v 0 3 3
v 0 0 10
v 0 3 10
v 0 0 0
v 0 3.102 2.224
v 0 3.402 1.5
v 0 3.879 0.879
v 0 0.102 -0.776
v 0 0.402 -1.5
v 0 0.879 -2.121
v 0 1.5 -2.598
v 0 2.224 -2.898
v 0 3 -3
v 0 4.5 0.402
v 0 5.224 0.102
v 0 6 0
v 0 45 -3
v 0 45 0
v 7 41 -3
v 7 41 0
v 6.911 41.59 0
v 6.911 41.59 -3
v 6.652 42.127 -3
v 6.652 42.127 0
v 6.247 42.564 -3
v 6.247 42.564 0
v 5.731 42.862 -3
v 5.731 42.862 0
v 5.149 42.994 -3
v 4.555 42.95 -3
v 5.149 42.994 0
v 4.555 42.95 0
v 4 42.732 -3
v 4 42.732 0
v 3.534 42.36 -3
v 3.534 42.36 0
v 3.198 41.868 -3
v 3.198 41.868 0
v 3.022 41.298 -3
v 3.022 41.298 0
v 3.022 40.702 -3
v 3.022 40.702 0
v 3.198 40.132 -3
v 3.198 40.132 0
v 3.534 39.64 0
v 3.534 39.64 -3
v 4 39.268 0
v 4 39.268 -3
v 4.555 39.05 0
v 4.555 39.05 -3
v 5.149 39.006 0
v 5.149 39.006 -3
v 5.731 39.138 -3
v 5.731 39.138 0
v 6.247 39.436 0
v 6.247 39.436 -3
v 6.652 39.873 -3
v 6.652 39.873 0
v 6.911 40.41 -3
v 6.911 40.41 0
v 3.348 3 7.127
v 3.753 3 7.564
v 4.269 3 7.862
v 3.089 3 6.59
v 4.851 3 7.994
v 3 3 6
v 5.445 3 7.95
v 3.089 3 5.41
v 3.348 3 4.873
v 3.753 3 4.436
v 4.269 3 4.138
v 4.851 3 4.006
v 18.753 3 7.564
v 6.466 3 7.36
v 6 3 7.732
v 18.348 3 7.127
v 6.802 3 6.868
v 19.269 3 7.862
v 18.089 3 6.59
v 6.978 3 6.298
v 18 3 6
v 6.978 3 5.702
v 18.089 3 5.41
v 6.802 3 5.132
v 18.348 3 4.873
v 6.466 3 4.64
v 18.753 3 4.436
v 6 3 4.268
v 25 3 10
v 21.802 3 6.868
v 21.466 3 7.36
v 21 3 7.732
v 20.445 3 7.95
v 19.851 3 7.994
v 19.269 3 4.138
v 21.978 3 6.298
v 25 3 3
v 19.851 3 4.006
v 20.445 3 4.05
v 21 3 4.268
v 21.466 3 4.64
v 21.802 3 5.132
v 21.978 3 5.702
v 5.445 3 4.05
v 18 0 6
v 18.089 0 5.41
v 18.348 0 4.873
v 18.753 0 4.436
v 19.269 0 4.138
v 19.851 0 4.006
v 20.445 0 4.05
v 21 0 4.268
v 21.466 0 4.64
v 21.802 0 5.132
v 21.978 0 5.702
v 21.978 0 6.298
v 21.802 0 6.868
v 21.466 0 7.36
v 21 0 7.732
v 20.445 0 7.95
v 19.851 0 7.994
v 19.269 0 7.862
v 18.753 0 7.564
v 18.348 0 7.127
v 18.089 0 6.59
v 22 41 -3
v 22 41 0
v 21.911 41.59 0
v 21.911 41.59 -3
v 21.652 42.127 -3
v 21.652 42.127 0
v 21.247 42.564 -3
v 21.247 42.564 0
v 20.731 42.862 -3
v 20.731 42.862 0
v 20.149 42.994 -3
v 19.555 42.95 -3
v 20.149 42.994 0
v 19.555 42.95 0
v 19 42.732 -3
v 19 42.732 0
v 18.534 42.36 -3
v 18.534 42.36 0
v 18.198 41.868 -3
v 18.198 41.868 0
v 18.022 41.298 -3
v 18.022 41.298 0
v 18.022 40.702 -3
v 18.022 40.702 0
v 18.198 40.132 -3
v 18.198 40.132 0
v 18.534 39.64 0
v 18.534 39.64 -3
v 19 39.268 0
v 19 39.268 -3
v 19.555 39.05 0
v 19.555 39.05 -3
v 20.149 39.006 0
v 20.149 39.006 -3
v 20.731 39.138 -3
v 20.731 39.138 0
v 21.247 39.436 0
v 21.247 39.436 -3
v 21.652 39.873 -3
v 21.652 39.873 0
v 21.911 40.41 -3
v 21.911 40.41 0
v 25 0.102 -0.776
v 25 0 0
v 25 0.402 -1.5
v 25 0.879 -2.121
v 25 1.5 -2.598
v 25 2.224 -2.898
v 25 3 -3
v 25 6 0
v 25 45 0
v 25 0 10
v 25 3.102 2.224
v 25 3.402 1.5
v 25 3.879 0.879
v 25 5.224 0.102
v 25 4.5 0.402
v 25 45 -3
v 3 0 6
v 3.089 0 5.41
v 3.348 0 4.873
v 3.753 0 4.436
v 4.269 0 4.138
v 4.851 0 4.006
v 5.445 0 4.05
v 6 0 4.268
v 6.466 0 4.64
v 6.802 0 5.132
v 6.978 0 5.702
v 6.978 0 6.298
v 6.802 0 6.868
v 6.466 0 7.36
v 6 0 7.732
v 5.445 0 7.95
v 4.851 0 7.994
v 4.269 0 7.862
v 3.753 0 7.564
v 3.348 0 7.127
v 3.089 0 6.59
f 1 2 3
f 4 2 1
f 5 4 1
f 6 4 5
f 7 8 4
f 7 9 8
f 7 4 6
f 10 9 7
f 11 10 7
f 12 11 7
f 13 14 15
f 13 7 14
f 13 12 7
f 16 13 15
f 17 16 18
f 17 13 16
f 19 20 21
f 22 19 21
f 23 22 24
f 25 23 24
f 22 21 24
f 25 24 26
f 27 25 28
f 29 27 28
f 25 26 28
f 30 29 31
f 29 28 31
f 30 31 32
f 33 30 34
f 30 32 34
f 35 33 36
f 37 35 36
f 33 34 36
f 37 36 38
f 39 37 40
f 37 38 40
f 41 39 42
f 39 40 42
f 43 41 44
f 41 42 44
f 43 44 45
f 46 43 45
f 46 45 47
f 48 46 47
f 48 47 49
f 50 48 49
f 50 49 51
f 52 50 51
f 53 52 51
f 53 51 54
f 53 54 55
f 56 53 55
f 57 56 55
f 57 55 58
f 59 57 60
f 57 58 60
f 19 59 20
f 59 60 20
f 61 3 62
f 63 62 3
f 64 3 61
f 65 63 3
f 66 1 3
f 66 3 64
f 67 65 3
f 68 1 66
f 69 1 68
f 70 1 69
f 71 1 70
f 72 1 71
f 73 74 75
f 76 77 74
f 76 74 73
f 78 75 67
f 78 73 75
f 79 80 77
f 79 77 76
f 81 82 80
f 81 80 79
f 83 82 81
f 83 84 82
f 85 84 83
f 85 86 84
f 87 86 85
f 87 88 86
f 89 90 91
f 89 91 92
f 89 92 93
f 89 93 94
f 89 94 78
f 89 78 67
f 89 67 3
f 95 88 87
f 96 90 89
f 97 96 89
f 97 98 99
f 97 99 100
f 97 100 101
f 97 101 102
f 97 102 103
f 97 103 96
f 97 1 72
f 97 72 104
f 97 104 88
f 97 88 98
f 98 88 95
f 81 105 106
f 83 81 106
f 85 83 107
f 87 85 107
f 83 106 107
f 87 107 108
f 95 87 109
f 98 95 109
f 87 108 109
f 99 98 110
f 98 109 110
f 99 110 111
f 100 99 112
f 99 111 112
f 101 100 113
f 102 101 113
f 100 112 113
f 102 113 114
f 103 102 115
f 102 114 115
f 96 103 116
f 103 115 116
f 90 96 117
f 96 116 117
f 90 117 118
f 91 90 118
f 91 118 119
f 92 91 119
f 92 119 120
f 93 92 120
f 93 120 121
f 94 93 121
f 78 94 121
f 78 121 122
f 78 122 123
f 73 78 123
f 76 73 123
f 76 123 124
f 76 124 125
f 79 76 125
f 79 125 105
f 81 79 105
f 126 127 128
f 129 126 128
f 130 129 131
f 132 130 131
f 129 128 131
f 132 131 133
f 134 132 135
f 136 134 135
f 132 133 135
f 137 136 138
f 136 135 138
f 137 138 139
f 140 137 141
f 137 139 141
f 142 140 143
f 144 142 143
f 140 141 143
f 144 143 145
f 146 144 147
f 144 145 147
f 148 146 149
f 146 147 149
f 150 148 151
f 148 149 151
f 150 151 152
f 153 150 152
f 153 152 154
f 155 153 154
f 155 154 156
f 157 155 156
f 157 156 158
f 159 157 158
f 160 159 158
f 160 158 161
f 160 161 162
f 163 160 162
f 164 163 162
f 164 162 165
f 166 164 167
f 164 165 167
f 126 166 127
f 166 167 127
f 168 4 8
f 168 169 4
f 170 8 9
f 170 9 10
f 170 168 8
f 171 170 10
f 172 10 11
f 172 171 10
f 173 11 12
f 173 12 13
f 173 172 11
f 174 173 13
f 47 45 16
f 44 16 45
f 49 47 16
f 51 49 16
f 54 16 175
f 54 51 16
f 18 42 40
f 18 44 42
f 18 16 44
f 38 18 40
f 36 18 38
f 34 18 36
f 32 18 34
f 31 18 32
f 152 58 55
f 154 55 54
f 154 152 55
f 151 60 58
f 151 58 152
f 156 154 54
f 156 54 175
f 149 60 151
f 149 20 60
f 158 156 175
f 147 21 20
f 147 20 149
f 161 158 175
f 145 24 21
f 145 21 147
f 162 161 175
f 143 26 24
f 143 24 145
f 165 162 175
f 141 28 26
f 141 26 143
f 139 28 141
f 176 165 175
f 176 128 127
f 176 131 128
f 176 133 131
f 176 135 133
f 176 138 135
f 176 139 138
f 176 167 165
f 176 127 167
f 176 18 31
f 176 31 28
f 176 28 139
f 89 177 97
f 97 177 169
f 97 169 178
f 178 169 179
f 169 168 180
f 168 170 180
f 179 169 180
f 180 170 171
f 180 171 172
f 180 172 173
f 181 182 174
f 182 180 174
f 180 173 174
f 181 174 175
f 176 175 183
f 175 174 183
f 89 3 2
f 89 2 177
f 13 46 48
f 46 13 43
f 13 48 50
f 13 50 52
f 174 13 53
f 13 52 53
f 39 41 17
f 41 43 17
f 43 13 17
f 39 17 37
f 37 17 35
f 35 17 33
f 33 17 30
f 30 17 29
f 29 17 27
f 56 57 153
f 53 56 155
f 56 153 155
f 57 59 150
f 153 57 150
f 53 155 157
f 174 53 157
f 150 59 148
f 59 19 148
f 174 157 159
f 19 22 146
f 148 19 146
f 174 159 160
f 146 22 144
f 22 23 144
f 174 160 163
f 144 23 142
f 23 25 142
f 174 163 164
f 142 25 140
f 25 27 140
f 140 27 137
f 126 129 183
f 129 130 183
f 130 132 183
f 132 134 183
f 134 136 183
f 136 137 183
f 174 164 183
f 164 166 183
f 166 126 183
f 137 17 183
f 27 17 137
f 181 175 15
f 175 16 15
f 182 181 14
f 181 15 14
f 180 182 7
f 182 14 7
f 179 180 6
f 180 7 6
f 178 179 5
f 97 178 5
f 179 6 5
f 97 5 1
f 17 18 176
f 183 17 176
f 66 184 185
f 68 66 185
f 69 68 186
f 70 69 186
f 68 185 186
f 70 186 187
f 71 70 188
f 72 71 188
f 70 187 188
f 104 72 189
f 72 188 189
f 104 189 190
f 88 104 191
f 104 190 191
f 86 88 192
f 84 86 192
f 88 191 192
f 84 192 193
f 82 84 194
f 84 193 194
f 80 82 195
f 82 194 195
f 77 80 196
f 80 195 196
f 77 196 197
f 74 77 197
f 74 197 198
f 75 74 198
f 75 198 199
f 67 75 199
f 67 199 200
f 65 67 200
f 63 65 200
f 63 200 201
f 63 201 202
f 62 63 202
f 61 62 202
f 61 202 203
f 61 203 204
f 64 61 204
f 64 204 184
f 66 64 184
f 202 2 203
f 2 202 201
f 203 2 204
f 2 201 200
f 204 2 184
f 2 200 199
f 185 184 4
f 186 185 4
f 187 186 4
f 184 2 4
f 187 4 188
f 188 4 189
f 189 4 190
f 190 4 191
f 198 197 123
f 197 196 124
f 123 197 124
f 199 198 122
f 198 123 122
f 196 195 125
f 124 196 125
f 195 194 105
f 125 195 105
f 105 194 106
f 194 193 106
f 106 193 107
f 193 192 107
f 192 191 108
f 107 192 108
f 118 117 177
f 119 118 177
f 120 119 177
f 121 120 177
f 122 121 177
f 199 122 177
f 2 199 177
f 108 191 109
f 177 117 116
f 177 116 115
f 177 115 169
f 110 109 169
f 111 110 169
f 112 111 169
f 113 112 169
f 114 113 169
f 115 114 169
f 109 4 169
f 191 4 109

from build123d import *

# Parameters (mm, degrees)
SKETCH1_W           = 25
SKETCH1_H           = 45
SKETCH1_R           = 2
BOSS_EXTRUDE1_DEPTH = 3
BOSS_EXTRUDE2_START = -3
SKETCH1_3_W         = 25
SKETCH1_3_H         = 3
BOSS_EXTRUDE2_DEPTH = 13
FILLET1_R           = 3
SKETCH2_R           = 2
CUT_EXTRUDE1_DEPTH  = 46


with BuildPart() as part:
    # Sketch1 → Boss-Extrude1 (new body)
    with BuildSketch(Plane.XY):
        with Locations((12.5, 22.5)):
            Rectangle(SKETCH1_W, SKETCH1_H)
        with Locations((20, 41)):
            Circle(SKETCH1_R, mode=Mode.SUBTRACT)
        with Locations((5, 41)):
            Circle(SKETCH1_R, mode=Mode.SUBTRACT)
    extrude(amount=-BOSS_EXTRUDE1_DEPTH)

    # Sketch1<3> → Boss-Extrude2 (add)
    with BuildSketch(Plane.XY.offset(BOSS_EXTRUDE2_START)):
        with Locations((12.5, 1.5)):
            Rectangle(SKETCH1_3_W, SKETCH1_3_H)
    extrude(amount=BOSS_EXTRUDE2_DEPTH)

    # Fillet1
    fillet1_edges = [part.edges().sort_by_distance(p)[0] for p in [
        (12.5, 3, 0),
        (12.5, 0, -3),
    ]]
    fillet(fillet1_edges, radius=FILLET1_R)

    # Sketch2 → Cut-Extrude1 (cut, through all)
    with BuildSketch(Plane(origin=(0, 0, 0), x_dir=(-1, 0, 0), z_dir=(0, -1, 0))):
        with Locations((-5, -6)):
            Circle(SKETCH2_R)
        with Locations((-20, -6)):
            Circle(SKETCH2_R)
    extrude(amount=-CUT_EXTRUDE1_DEPTH, mode=Mode.SUBTRACT)


solid = part.part
